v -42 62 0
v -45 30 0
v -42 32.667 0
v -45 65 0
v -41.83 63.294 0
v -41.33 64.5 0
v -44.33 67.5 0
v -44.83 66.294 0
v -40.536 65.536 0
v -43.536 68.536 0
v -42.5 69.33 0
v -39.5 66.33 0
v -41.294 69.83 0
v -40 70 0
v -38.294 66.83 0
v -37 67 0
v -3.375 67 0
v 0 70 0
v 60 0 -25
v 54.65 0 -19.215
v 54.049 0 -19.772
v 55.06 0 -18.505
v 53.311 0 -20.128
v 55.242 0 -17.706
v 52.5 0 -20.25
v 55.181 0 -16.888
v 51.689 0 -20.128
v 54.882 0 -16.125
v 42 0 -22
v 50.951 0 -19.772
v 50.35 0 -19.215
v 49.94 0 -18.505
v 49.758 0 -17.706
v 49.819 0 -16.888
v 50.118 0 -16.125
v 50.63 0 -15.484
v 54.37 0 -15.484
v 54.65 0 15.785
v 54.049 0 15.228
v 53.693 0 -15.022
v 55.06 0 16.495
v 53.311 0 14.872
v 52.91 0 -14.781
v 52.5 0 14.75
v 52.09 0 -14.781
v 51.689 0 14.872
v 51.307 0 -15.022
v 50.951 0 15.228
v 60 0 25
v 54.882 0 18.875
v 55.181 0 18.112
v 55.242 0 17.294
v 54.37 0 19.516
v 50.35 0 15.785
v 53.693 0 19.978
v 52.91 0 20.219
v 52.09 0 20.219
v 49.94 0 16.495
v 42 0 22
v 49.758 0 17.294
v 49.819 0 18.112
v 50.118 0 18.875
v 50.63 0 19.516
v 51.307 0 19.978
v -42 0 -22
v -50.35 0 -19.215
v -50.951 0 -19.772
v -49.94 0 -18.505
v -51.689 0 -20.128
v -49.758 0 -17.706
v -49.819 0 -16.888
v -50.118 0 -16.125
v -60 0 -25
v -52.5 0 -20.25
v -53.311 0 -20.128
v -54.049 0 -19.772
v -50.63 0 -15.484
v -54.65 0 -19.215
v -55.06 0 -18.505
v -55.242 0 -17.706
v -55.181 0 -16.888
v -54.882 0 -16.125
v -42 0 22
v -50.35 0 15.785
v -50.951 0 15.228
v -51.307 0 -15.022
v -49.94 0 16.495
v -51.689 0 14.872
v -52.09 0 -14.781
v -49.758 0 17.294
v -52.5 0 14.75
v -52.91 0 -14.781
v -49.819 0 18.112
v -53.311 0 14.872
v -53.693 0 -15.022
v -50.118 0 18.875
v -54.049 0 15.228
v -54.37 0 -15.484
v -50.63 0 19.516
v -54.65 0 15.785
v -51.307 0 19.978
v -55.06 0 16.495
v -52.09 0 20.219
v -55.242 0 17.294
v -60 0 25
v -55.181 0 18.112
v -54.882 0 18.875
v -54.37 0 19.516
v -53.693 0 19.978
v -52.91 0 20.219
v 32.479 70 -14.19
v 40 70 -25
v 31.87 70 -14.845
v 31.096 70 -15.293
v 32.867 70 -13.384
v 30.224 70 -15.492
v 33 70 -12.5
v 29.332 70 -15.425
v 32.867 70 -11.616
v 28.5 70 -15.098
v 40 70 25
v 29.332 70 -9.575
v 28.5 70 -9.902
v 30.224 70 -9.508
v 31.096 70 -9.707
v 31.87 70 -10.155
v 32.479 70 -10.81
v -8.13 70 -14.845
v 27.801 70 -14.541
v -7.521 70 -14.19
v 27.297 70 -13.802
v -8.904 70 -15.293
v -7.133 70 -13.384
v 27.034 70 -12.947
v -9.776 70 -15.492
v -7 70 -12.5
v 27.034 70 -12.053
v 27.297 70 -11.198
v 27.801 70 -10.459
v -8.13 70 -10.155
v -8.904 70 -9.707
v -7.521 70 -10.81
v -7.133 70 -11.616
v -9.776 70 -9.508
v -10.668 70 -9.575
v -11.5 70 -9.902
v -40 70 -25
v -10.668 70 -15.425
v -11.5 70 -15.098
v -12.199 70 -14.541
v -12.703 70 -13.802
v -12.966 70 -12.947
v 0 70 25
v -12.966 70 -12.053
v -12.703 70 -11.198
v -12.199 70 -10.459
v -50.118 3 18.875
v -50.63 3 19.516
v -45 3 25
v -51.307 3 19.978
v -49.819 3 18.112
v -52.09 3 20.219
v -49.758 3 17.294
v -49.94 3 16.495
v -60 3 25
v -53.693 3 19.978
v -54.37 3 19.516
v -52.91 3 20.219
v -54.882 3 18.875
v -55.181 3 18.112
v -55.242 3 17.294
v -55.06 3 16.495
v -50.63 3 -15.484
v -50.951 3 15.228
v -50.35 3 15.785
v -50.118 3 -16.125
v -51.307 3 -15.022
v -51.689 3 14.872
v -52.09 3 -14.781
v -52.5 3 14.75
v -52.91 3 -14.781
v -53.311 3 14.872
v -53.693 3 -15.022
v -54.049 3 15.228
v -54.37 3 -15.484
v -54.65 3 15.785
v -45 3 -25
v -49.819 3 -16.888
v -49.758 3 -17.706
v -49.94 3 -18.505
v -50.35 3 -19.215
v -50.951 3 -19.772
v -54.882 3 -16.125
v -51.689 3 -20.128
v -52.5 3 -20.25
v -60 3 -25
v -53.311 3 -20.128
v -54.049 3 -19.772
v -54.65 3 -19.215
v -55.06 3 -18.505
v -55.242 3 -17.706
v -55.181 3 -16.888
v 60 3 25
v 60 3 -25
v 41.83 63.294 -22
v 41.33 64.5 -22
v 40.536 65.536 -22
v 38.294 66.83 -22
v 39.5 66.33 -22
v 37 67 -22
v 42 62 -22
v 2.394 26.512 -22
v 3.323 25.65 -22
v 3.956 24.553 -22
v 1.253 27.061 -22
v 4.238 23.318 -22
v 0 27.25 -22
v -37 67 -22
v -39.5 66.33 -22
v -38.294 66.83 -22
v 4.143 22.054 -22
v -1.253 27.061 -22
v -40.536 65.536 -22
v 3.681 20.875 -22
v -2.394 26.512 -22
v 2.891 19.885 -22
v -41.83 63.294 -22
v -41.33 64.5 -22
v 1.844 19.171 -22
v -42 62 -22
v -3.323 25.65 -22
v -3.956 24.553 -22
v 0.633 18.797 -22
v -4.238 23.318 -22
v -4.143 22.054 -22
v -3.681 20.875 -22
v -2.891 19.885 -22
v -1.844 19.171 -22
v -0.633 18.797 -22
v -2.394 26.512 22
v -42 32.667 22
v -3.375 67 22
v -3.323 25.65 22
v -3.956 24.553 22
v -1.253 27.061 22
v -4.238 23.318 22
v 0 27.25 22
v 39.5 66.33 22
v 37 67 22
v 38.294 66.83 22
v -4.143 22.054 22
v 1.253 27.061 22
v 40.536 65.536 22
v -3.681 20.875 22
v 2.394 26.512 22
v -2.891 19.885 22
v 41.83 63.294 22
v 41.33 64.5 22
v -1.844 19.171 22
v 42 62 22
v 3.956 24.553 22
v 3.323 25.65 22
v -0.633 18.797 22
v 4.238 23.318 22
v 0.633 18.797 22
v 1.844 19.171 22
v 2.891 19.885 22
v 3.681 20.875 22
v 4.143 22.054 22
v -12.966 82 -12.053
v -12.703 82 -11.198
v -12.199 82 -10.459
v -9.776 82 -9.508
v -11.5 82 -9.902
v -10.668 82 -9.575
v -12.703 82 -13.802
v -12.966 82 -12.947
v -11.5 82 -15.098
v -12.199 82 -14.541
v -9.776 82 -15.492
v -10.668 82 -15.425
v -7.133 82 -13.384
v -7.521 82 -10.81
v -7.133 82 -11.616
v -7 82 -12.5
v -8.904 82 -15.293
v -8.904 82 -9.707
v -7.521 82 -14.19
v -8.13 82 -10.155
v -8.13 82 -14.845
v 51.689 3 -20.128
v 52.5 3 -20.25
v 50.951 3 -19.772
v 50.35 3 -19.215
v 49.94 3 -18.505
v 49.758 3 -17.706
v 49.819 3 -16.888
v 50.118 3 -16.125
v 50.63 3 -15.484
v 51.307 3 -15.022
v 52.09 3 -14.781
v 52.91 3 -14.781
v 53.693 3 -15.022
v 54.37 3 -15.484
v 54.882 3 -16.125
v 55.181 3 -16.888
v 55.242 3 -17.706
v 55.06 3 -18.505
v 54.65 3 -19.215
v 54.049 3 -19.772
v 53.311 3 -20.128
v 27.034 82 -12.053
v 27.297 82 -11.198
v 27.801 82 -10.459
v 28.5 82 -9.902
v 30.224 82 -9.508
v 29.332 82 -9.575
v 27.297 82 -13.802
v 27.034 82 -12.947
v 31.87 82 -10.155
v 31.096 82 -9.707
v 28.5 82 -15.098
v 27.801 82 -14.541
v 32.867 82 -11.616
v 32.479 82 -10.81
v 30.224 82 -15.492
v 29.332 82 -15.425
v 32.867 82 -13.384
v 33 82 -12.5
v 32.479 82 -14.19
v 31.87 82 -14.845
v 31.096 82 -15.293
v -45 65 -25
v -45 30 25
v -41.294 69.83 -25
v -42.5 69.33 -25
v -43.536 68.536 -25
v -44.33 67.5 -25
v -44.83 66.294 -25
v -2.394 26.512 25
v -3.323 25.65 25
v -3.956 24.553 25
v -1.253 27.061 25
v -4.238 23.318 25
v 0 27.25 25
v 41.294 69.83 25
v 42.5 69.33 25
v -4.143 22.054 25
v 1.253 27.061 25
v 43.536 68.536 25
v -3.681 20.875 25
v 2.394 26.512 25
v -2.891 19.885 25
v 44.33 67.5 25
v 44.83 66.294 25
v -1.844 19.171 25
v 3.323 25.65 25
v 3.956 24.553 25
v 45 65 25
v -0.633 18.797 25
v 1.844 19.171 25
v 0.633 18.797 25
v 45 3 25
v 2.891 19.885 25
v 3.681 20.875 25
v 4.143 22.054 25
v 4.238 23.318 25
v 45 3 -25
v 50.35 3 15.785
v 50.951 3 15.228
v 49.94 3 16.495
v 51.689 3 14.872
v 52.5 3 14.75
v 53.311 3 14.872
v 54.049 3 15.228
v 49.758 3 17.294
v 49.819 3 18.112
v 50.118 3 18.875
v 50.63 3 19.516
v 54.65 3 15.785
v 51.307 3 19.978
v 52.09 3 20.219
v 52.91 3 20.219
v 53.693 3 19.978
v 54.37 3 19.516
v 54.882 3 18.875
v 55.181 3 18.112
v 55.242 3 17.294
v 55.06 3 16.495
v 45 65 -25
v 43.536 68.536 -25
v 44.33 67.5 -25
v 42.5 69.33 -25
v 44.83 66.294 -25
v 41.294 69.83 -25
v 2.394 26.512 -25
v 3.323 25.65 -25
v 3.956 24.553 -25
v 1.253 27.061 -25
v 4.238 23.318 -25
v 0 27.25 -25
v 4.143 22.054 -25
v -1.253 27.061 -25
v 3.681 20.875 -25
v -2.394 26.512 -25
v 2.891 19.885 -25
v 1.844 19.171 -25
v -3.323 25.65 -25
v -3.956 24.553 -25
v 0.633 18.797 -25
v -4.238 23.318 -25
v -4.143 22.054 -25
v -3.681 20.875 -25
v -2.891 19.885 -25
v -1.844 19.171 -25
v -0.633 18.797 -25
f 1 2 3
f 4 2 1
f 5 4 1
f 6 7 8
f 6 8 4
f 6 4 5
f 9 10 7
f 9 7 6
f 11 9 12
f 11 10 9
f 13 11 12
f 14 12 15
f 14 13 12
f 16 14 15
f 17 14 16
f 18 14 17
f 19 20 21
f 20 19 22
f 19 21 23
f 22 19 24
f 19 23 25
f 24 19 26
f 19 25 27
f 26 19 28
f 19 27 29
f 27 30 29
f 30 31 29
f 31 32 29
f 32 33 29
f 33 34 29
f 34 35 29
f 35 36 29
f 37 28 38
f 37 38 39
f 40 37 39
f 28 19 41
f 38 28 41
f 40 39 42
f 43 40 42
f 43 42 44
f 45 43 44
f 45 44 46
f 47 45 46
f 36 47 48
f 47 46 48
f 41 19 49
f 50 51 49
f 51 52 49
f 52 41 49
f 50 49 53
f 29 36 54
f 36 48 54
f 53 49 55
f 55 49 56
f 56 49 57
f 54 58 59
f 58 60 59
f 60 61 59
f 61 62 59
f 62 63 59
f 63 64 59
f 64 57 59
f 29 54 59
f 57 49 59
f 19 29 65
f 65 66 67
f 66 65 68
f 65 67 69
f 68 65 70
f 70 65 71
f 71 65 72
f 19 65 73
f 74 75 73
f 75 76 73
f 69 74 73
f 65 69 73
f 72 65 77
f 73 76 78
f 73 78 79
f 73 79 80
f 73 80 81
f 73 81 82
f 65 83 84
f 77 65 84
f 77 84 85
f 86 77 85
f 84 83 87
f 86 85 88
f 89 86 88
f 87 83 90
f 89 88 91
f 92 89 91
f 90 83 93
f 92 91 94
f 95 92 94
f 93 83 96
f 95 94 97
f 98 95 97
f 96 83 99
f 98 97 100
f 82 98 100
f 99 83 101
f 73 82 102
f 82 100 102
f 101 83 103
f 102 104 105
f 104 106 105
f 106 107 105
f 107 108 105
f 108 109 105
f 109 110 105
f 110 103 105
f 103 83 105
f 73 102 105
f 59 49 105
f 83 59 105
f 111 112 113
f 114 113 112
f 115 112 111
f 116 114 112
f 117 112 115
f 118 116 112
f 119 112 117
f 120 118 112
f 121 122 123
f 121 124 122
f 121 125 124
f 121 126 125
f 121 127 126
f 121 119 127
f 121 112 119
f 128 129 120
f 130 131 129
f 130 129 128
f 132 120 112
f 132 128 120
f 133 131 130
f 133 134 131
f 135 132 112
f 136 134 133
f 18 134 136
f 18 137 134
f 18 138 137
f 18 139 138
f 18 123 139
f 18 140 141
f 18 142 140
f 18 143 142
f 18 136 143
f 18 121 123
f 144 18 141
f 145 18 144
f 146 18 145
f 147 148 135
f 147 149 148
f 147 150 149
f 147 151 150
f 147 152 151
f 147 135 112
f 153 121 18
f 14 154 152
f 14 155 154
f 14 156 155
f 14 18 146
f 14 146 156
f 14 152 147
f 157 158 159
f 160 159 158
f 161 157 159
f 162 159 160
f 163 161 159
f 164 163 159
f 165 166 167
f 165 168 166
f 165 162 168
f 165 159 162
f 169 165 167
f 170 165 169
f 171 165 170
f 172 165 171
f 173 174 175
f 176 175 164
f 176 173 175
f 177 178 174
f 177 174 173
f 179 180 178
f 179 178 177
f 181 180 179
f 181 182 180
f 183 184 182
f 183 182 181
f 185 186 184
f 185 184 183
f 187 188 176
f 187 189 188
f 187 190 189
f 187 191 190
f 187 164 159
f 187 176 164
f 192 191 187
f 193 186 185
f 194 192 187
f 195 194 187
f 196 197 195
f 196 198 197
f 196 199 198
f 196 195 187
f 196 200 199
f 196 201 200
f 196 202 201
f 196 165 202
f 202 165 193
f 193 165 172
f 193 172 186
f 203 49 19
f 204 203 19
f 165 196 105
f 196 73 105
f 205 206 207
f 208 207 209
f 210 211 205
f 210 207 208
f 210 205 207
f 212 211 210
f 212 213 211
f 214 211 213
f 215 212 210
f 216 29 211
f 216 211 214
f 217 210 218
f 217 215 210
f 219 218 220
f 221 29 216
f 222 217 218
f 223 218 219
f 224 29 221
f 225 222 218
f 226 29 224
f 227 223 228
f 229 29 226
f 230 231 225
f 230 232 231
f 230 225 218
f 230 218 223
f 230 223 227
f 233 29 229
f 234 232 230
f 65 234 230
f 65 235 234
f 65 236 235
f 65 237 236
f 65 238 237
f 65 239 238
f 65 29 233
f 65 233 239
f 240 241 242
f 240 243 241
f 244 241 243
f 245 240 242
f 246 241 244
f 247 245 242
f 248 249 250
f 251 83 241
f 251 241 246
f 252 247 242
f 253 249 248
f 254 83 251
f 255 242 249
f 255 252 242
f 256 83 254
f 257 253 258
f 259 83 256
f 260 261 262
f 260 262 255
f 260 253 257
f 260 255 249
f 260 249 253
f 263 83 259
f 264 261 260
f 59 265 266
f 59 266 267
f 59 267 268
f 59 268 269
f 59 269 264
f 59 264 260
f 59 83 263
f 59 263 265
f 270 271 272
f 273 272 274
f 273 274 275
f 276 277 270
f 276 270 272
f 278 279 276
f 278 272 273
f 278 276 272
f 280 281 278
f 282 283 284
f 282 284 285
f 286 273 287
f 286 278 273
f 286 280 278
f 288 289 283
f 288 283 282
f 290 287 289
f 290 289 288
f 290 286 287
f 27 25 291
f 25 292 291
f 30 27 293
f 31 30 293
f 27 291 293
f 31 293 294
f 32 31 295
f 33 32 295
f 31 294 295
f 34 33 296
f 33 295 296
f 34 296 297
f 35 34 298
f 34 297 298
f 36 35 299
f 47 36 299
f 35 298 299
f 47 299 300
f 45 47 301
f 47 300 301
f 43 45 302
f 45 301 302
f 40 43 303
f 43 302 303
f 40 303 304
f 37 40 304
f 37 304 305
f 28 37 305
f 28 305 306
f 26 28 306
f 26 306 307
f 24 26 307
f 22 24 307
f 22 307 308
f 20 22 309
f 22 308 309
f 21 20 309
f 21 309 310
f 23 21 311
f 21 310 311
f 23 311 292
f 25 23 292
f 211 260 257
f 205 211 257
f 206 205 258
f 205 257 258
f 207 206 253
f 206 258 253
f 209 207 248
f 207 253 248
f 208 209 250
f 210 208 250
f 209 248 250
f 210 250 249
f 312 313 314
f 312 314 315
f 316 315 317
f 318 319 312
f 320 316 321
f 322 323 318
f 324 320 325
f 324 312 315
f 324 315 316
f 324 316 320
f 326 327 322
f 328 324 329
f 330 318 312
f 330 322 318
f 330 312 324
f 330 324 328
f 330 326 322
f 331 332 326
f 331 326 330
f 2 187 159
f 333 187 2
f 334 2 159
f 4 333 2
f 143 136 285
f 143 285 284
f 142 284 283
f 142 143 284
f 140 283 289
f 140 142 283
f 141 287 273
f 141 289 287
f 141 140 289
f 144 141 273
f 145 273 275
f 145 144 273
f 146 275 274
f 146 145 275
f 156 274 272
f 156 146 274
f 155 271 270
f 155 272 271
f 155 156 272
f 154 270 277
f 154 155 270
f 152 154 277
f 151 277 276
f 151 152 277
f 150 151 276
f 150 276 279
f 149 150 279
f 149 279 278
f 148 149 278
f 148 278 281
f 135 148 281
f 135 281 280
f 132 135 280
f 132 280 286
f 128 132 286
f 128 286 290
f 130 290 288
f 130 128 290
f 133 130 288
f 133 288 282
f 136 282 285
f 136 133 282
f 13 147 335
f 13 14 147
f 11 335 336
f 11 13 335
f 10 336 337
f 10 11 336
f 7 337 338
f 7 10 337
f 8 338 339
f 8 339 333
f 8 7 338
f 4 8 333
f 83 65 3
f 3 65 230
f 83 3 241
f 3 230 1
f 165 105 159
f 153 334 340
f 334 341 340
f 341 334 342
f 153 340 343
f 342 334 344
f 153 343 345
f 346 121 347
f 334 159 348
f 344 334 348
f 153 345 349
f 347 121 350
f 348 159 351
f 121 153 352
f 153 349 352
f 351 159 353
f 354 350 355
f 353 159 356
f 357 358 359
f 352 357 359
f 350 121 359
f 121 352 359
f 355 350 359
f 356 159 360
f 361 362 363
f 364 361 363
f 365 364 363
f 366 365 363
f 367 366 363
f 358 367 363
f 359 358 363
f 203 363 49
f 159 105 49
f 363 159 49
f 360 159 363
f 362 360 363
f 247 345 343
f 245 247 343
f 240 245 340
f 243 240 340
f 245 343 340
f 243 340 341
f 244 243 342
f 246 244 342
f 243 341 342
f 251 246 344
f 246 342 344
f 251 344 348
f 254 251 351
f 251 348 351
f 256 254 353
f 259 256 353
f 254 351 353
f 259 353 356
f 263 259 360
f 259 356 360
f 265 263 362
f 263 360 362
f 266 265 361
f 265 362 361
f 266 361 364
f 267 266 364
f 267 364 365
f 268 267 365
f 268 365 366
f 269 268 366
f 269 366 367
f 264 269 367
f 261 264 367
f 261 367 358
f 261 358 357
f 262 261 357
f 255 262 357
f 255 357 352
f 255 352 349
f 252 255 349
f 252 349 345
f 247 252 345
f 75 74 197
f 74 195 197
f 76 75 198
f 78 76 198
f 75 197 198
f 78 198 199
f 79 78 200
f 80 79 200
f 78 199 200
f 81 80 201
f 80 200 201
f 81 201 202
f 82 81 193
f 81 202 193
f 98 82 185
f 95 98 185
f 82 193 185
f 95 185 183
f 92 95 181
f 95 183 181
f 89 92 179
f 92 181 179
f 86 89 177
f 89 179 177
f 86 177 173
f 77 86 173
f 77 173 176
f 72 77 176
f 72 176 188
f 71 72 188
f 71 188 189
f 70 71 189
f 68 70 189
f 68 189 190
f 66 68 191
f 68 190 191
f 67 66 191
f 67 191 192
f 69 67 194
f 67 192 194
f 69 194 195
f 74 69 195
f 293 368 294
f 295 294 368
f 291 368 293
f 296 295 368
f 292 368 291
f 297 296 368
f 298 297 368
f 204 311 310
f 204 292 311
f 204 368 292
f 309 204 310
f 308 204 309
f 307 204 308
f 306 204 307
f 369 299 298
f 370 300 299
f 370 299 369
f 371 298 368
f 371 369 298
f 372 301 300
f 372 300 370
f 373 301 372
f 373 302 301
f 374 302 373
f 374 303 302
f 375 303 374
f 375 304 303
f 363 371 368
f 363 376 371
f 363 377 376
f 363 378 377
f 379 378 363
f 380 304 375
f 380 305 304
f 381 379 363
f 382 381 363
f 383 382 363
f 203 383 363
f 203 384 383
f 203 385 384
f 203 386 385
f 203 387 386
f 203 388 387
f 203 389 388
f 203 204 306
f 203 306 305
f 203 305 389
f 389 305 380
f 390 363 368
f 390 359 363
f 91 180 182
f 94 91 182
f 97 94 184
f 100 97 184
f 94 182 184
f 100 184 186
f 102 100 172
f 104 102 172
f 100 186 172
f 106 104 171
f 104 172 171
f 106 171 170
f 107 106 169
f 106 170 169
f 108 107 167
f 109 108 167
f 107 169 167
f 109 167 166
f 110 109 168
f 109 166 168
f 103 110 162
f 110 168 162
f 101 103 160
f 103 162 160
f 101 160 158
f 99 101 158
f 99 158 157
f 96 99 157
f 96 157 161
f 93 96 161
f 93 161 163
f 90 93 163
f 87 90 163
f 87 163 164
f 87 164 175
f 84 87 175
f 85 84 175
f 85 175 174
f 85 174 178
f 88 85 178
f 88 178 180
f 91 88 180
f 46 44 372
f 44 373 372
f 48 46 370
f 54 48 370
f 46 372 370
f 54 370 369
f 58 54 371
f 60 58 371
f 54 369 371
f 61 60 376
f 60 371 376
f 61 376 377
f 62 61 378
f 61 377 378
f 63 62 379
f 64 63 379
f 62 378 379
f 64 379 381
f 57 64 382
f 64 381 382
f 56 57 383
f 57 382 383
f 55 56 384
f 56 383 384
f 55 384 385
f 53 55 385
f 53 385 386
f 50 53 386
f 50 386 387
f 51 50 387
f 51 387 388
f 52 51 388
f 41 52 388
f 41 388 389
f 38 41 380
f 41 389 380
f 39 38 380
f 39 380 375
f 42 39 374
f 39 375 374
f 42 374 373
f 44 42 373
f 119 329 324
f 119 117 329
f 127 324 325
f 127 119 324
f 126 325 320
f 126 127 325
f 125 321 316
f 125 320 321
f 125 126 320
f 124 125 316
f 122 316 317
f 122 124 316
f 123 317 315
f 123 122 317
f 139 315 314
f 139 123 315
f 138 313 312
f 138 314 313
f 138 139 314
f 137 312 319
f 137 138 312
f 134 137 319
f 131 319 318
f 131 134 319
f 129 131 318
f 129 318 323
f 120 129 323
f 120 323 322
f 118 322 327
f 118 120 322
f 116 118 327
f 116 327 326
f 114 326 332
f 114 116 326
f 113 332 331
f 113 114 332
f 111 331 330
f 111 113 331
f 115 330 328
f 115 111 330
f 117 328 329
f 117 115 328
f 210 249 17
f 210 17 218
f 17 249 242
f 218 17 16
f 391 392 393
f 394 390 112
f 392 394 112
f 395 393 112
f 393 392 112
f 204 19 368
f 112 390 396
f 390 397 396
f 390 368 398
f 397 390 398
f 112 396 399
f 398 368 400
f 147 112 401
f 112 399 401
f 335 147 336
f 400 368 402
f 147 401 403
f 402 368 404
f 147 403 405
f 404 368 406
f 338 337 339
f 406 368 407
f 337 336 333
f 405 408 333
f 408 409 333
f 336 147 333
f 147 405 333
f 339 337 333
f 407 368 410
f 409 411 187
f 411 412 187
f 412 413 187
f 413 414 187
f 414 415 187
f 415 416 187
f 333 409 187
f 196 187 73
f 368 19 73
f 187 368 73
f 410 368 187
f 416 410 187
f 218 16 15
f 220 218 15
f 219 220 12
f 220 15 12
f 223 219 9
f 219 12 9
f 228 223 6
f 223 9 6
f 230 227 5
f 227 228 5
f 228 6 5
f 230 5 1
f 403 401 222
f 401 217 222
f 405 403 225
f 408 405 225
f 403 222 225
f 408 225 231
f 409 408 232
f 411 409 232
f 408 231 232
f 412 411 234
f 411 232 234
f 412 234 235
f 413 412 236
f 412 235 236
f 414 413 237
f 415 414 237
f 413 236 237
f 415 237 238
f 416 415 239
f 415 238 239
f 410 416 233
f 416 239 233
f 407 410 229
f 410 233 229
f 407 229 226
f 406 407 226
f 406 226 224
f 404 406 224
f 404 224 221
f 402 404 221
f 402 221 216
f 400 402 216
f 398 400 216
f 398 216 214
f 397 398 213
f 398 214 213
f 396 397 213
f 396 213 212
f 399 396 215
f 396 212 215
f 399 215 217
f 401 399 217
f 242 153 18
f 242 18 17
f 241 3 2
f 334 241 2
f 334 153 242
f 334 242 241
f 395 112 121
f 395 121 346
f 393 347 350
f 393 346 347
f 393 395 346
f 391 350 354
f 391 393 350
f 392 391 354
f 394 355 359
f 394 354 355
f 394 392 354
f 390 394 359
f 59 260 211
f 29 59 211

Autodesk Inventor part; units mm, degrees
ref_plane "YZ Plane" through (0, 0, 0) normal (1, 0, 0) x (0, 1, 0)
ref_plane "XZ Plane" through (0, 0, 0) normal (0, 1, 0) x (-1, 0, 0)
ref_plane "XY Plane" through (0, 0, 0) normal (0, 0, 1) x (1, 0, 0)
sketch "Skizze1" plane through (0, 0, 0) normal (0, 1, 0) x (-1, 0, 0)
  line L0 (60, 25) -> (-60, 25)
  line L1 (-60, 25) -> (-60, -25)
  line L2 (-60, -25) -> (60, -25)
  line L3 (60, -25) -> (60, 25)
  point P0 (0, 0)
  point P1 (0, 25)
  point P2 (-60, 0)
  dimension "d0" = 120
  dimension "d1" = 50
extrude "Extrusion1" add sketch "Skizze1" along normal blind 70
sketch "Skizze2" plane through (60, 0, 25) normal (1, 0, 0) x (0, 0, -1)
  line L0 (0, 0) -> (50, 0) construction
  line L1 (50, 0) -> (50, 70) construction
  line L2 (0, 70) -> (50, 70) construction
  line L3 (0, 0) -> (0, 70) construction
  line L4 (0, 70) -> (50, 70)
  line L5 (50, 70) -> (50, 3)
  line L6 (50, 3) -> (0, 3)
  line L7 (0, 3) -> (0, 70)
  line L8 (50, 0) -> (50, 70) projected
  point P0 (25, 0)
  dimension "d4" = 3
extrude "Extrusion2" cut sketch "Skizze2" against normal blind 15
sketch "Skizze3" plane through (-60, 0, -25) normal (-1, 0, 0) x (0, 0, 1)
  line L0 (0, 0) -> (50, 0) construction
  line L1 (50, 0) -> (50, 70) construction
  line L2 (0, 70) -> (50, 70) construction
  line L3 (0, 0) -> (0, 70) construction
  line L4 (0, 70) -> (50, 70)
  line L5 (50, 70) -> (50, 3)
  line L6 (50, 3) -> (0, 3)
  line L7 (0, 3) -> (0, 70)
  line L8 (50, 0) -> (50, 70) projected
  point P0 (25, 0)
  dimension "d7" = 3
extrude "Extrusion3" cut sketch "Skizze3" against normal blind 15
shell "Wandung1" thickness 3 removed faces 1 at (20, 0, 8.3333)
sketch "Skizze4" plane through (0, 0, 0) normal (0, -1, 0) x (1, 0, 0)
  line L0 (42, 22) -> (42, -22) construction
  line L1 (42, -22) -> (-42, -22) construction
  line L2 (-42, -22) -> (-42, 22) construction
  line L3 (-42, 22) -> (42, 22) construction
  line L4 (-60, 25) -> (60, 25) construction
  line L5 (-60, -25) -> (-60, 25) construction
  line L6 (60, -25) -> (-60, -25) construction
  line L7 (60, 25) -> (60, -25) construction
  line L8 (-84, 0) -> (84, 0) construction
  line L9 (0, -35) -> (0, 35) construction
  point P0 (0, 0)
  point P1 (-52.5, -17.5)
  point P2 (-52.5, 17.5)
  point P3 (52.5, 17.5)
  point P4 (52.5, -17.5)
  dimension "d11" = 7.5
  dimension "d12" = 7.5
hole "Bohrung1" at (-52.5, 0, -17.5) at (-52.5, 0, 17.5) at (52.5, 0, 17.5) at (52.5, 0, -17.5) direction (0, 1, 0) diameter 5.5 end through all
sketch "Skizze5" plane through (60, 0, -25) normal (0, 0, -1) x (-1, 0, 0)
  line L0 (120, 3) -> (105, 3) projected
  line L1 (105, 3) -> (105, 70) projected
  line L2 (15, 70) -> (105, 70) projected
  line L3 (15, 70) -> (15, 3) projected
  line L4 (15, 3) -> (0, 3) projected
  line L5 (0, 0) -> (0, 3) projected
  line L6 (0, 0) -> (120, 0) projected
  line L7 (120, 0) -> (120, 3) projected
  point P0 (60, 0)
  point P1 (60, 23)
  point P2 (60, 0)
  dimension "d20" = 23
hole "Bohrung2" at (0, 23, -25) direction (0, 0, 1) diameter 8.5 end through all
sketch "Skizze6" plane through (-60, 0, 25) normal (0, 0, 1) x (1, 0, 0)
  circle A0 centre (60, 23) radius 4.25 construction
  line L0 (15, 3) -> (0, 3) construction
  line L1 (0, 0) -> (0, 3) construction
  line L2 (0, 0) -> (120, 0) construction
  line L3 (120, 0) -> (120, 3) construction
  line L4 (120, 3) -> (105, 3) construction
  line L5 (105, 3) -> (105, 70) construction
  line L6 (15, 70) -> (105, 70) construction
  line L7 (15, 70) -> (15, 3) construction
  line L8 (15, 70) -> (60, 70)
  line L9 (60, 70) -> (15, 30)
  line L10 (15, 30) -> (15, 70)
  line L11 (15, 70) -> (15, 3) projected
  point P0 (60, 0)
  dimension "d28" = 45
  dimension "d29" = 30
extrude "Extrusion4" cut sketch "Skizze6" against normal blind 25
sketch "Skizze7" plane through (0, 70, 0) normal (0, 1, 0) x (1, 0, 0)
  line L0 (0, 0) -> (0, -25) construction
  line L1 (0, -25) -> (45, -25) construction
  line L2 (45, -25) -> (45, 25) construction
  line L3 (45, 25) -> (-45, 25) construction
  line L4 (-45, 25) -> (-45, 0) construction
  line L5 (-45, 0) -> (0, 0) construction
  circle A0 centre (-10, 12.5) radius 3
  circle A1 centre (30, 12.5) radius 3
  point P0 (0, 0)
  point P1 (-45, 12.5)
  dimension "d32" = 6
  dimension "d34" = 6
  dimension "d35" = 40
  dimension "d43" = 15
extrude "Extrusion5" add sketch "Skizze7" along normal blind 12
thread "Gewinde1" size "M6x1" class "6g" standard "ANSI Metric M Profile" full length
thread "Gewinde2" size "M6x1" class "6g" standard "ANSI Metric M Profile" full length
fillet "Rundung1" radius 5 4 edges at (42, 67, 0) (-42, 67, -11) (-45, 70, -12.5) (45, 70, 0)
equation "\"d12\" = d11"
properties part number "Radkasten_Links"
